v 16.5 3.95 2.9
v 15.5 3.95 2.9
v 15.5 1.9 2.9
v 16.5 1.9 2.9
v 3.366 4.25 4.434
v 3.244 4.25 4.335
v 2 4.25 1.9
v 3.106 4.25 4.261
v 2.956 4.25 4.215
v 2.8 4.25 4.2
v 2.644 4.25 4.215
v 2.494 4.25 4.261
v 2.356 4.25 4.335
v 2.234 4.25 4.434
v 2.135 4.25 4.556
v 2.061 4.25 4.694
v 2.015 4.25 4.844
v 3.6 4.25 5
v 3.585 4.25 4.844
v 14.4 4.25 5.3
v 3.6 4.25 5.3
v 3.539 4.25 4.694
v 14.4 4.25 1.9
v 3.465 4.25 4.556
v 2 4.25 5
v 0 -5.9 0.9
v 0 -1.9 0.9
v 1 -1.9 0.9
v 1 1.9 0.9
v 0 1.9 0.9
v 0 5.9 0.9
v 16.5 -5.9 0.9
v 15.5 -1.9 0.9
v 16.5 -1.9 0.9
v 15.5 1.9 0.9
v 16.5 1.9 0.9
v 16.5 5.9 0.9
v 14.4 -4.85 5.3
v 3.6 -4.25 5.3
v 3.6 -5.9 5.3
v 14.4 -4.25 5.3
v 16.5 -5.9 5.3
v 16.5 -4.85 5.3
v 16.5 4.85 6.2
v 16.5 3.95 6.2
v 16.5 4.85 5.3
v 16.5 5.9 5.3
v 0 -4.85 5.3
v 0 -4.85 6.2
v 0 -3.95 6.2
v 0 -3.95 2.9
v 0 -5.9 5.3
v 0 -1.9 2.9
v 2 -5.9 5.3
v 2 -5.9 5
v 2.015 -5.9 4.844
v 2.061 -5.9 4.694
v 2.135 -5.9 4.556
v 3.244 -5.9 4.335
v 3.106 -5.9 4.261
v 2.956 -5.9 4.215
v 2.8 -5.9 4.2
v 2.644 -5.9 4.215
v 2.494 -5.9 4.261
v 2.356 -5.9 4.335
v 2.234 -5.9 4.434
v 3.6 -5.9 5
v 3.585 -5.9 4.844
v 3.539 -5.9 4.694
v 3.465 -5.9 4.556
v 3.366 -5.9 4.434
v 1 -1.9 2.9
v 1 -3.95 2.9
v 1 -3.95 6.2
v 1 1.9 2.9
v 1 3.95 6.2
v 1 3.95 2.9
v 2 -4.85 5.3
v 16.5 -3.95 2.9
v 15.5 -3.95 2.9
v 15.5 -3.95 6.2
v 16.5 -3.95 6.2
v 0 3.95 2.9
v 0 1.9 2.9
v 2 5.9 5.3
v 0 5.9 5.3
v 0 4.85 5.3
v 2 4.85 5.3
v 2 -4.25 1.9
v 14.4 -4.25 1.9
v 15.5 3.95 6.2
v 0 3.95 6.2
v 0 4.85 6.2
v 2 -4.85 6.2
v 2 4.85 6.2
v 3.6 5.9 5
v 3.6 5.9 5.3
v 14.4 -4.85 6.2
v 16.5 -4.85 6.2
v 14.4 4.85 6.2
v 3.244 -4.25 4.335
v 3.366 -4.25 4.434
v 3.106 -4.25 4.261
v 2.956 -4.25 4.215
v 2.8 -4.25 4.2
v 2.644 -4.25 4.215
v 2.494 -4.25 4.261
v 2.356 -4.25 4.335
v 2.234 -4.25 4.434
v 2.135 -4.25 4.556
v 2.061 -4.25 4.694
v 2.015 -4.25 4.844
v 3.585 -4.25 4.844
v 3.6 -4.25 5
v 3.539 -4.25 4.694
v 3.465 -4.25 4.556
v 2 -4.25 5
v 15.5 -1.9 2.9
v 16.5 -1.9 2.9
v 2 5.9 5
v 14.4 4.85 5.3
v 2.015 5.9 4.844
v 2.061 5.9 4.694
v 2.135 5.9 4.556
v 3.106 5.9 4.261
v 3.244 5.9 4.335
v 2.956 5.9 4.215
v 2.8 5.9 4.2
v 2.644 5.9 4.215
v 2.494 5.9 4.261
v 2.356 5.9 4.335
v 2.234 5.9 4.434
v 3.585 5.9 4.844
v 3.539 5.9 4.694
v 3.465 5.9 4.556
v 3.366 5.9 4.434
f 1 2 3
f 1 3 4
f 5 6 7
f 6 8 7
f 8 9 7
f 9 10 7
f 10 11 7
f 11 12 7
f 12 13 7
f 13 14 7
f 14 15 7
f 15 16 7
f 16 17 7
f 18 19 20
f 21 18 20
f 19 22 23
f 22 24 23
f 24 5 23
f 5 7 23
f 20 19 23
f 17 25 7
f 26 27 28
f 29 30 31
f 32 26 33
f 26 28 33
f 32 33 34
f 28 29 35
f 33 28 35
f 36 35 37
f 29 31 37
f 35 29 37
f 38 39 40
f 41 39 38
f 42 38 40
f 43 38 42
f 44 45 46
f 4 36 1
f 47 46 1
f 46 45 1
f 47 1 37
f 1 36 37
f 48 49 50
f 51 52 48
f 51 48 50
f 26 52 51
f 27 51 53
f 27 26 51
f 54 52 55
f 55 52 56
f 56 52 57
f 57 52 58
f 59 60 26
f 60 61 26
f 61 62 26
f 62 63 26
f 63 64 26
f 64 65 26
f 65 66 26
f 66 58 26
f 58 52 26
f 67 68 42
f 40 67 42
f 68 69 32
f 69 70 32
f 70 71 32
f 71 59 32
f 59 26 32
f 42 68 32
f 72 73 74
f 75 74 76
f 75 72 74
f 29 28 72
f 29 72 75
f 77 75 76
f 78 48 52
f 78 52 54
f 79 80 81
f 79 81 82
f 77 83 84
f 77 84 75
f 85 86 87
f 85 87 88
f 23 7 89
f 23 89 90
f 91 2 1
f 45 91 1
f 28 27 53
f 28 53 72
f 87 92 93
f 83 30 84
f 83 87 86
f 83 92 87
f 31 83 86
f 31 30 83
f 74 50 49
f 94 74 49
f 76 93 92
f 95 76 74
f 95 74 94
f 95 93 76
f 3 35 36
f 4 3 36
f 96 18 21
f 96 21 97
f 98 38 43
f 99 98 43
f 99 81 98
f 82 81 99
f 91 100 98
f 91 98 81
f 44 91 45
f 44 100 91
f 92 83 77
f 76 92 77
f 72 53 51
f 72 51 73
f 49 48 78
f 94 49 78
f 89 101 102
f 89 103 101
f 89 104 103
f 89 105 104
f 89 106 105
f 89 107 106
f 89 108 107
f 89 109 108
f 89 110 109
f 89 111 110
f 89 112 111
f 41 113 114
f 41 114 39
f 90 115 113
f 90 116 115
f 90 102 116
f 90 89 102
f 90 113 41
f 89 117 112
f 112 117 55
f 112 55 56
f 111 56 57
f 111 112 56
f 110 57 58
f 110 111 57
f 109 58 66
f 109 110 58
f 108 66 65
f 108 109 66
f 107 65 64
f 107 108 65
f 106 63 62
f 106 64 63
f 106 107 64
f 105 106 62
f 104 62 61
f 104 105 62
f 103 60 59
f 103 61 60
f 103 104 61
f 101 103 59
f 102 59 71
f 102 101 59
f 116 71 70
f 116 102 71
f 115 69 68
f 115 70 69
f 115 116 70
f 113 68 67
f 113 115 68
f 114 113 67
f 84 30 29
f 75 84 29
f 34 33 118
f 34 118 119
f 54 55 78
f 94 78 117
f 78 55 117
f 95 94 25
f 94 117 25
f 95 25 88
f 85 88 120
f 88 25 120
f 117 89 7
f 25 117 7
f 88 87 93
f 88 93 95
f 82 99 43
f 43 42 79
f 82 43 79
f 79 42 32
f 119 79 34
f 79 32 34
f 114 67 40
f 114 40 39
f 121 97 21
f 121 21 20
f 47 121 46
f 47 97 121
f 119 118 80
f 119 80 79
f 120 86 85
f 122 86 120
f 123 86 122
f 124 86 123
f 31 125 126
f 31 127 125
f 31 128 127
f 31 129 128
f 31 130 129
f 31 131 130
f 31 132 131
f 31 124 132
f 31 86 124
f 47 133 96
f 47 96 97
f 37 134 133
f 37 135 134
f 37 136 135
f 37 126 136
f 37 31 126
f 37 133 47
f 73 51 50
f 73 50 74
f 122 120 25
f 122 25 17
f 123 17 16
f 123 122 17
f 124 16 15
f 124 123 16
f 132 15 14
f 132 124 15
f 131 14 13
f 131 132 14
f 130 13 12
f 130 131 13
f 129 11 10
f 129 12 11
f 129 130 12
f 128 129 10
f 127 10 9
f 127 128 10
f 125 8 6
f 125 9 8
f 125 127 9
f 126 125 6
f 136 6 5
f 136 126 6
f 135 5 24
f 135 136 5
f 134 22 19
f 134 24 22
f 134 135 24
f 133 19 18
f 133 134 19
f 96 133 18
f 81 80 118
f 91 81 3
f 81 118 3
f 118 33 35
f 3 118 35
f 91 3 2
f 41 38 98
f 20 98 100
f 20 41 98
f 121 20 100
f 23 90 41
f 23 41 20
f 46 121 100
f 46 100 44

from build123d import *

# Parameters (mm, degrees)
BOX019_W          = 12.3
BOX019_H          = 9.7
BOX019_DEPTH      = 1
CYLINDER004_R     = 0.8
CYLINDER004_DEPTH = 20
BOX018_W          = 1.6
BOX018_H          = 20
BOX018_DEPTH      = 3
BOX017_W          = 12.4
BOX017_H          = 8.5
BOX017_DEPTH      = 4.3
BOX013_W          = 1
BOX013_H          = 2.05
BOX013_DEPTH      = 3.3
BOX014_W          = 1
BOX014_H          = 2.05
BOX014_DEPTH      = 3.3
BOX011_W          = 1
BOX011_H          = 2.05
BOX011_DEPTH      = 3.3
BOX012_W          = 1
BOX012_H          = 2.05
BOX012_DEPTH      = 3.3
BOX010_W          = 1
BOX010_H          = 3.8
BOX010_DEPTH      = 5.3
BOX009_W          = 1
BOX009_H          = 3.8
BOX009_DEPTH      = 5.3
BOX007_W          = 16.5
BOX007_H          = 1.05
BOX007_DEPTH      = 1
BOX008_W          = 16.5
BOX008_H          = 1.05
BOX008_DEPTH      = 1
BOX_W             = 16.5
BOX_H             = 11.8
BOX_DEPTH         = 5.3


with BuildPart() as cube016:
    # Box019 → Box019 (new body)
    with BuildSketch(Plane(origin=(2.1, -4.85, 5.3), x_dir=(1, 0, 0), z_dir=(0, 0, 1))):
        with Locations((6.15, 4.85)):
            Rectangle(BOX019_W, BOX019_H)
    extrude(amount=BOX019_DEPTH)


with BuildPart() as cylinder004:
    # Cylinder004 → Cylinder004 (new body)
    with BuildSketch(Plane(origin=(2.8, 10, 5), x_dir=(1, 0, 0), z_dir=(0, -1, 0))):
        Circle(CYLINDER004_R)
    extrude(amount=CYLINDER004_DEPTH)


with BuildPart() as fusion005:
    # Box018 → Box018 (new body)
    with BuildSketch(Plane(origin=(2, -10, 5), x_dir=(1, 0, 0), z_dir=(0, 0, 1))):
        with Locations((0.8, 10)):
            Rectangle(BOX018_W, BOX018_H)
    extrude(amount=BOX018_DEPTH)

    # Fusion005: union Cylinder004
    add(cylinder004.part)


with BuildPart() as cube:
    # Box017 → Box017 (new body)
    with BuildSketch(Plane(origin=(2, -4.25, 1.9), x_dir=(1, 0, 0), z_dir=(0, 0, 1))):
        with Locations((6.2, 4.25)):
            Rectangle(BOX017_W, BOX017_H)
    extrude(amount=BOX017_DEPTH)


with BuildPart() as cube011:
    # Box013 → Box013 (new body)
    with BuildSketch(Plane(origin=(0, 1.9, 2.9), x_dir=(1, 0, 0), z_dir=(0, 0, 1))):
        with Locations((0.5, 1.025)):
            Rectangle(BOX013_W, BOX013_H)
    extrude(amount=BOX013_DEPTH)


with BuildPart() as cube012:
    # Box014 → Box014 (new body)
    with BuildSketch(Plane(origin=(0, -3.95, 2.9), x_dir=(1, 0, 0), z_dir=(0, 0, 1))):
        with Locations((0.5, 1.025)):
            Rectangle(BOX014_W, BOX014_H)
    extrude(amount=BOX014_DEPTH)


with BuildPart() as cube009:
    # Box011 → Box011 (new body)
    with BuildSketch(Plane(origin=(15.5, -3.95, 2.9), x_dir=(1, 0, 0), z_dir=(0, 0, 1))):
        with Locations((0.5, 1.025)):
            Rectangle(BOX011_W, BOX011_H)
    extrude(amount=BOX011_DEPTH)


with BuildPart() as cube010:
    # Box012 → Box012 (new body)
    with BuildSketch(Plane(origin=(15.5, 1.9, 2.9), x_dir=(1, 0, 0), z_dir=(0, 0, 1))):
        with Locations((0.5, 1.025)):
            Rectangle(BOX012_W, BOX012_H)
    extrude(amount=BOX012_DEPTH)


with BuildPart() as cube008:
    # Box010 → Box010 (new body)
    with BuildSketch(Plane(origin=(15.5, -1.9, 0.9), x_dir=(1, 0, 0), z_dir=(0, 0, 1))):
        with Locations((0.5, 1.9)):
            Rectangle(BOX010_W, BOX010_H)
    extrude(amount=BOX010_DEPTH)


with BuildPart() as fusion003:
    # Box009 → Box009 (new body)
    with BuildSketch(Plane(origin=(0, -1.9, 0.9), x_dir=(1, 0, 0), z_dir=(0, 0, 1))):
        with Locations((0.5, 1.9)):
            Rectangle(BOX009_W, BOX009_H)
    extrude(amount=BOX009_DEPTH)

    # Fusion003: union Cube011, Cube012, Cube009, Cube010, Cube008
    add(cube011.part)
    add(cube012.part)
    add(cube009.part)
    add(cube010.part)
    add(cube008.part)


with BuildPart() as cube005:
    # Box007 → Box007 (new body)
    with BuildSketch(Plane(origin=(0, 4.85, 5.3), x_dir=(1, 0, 0), z_dir=(0, 0, 1))):
        with Locations((8.25, 0.525)):
            Rectangle(BOX007_W, BOX007_H)
    extrude(amount=BOX007_DEPTH)


with BuildPart() as fusion002:
    # Box008 → Box008 (new body)
    with BuildSketch(Plane(origin=(0, -5.9, 5.3), x_dir=(1, 0, 0), z_dir=(0, 0, 1))):
        with Locations((8.25, 0.525)):
            Rectangle(BOX008_W, BOX008_H)
    extrude(amount=BOX008_DEPTH)

    # Fusion002: union Cube005
    add(cube005.part)


with BuildPart() as cut006:
    # Box → Box (new body)
    with BuildSketch(Plane(origin=(0, -5.9, 0.9), x_dir=(1, 0, 0), z_dir=(0, 0, 1))):
        with Locations((8.25, 5.9)):
            Rectangle(BOX_W, BOX_H)
    extrude(amount=BOX_DEPTH)

    # Cut002: cut Fusion002
    add(fusion002.part, mode=Mode.SUBTRACT)

    # Cut003: cut Fusion003
    add(fusion003.part, mode=Mode.SUBTRACT)

    # Cut004: cut Cube
    add(cube.part, mode=Mode.SUBTRACT)

    # Cut005: cut Fusion005
    add(fusion005.part, mode=Mode.SUBTRACT)

    # Cut006: cut Cube016
    add(cube016.part, mode=Mode.SUBTRACT)


solid = cut006.part
